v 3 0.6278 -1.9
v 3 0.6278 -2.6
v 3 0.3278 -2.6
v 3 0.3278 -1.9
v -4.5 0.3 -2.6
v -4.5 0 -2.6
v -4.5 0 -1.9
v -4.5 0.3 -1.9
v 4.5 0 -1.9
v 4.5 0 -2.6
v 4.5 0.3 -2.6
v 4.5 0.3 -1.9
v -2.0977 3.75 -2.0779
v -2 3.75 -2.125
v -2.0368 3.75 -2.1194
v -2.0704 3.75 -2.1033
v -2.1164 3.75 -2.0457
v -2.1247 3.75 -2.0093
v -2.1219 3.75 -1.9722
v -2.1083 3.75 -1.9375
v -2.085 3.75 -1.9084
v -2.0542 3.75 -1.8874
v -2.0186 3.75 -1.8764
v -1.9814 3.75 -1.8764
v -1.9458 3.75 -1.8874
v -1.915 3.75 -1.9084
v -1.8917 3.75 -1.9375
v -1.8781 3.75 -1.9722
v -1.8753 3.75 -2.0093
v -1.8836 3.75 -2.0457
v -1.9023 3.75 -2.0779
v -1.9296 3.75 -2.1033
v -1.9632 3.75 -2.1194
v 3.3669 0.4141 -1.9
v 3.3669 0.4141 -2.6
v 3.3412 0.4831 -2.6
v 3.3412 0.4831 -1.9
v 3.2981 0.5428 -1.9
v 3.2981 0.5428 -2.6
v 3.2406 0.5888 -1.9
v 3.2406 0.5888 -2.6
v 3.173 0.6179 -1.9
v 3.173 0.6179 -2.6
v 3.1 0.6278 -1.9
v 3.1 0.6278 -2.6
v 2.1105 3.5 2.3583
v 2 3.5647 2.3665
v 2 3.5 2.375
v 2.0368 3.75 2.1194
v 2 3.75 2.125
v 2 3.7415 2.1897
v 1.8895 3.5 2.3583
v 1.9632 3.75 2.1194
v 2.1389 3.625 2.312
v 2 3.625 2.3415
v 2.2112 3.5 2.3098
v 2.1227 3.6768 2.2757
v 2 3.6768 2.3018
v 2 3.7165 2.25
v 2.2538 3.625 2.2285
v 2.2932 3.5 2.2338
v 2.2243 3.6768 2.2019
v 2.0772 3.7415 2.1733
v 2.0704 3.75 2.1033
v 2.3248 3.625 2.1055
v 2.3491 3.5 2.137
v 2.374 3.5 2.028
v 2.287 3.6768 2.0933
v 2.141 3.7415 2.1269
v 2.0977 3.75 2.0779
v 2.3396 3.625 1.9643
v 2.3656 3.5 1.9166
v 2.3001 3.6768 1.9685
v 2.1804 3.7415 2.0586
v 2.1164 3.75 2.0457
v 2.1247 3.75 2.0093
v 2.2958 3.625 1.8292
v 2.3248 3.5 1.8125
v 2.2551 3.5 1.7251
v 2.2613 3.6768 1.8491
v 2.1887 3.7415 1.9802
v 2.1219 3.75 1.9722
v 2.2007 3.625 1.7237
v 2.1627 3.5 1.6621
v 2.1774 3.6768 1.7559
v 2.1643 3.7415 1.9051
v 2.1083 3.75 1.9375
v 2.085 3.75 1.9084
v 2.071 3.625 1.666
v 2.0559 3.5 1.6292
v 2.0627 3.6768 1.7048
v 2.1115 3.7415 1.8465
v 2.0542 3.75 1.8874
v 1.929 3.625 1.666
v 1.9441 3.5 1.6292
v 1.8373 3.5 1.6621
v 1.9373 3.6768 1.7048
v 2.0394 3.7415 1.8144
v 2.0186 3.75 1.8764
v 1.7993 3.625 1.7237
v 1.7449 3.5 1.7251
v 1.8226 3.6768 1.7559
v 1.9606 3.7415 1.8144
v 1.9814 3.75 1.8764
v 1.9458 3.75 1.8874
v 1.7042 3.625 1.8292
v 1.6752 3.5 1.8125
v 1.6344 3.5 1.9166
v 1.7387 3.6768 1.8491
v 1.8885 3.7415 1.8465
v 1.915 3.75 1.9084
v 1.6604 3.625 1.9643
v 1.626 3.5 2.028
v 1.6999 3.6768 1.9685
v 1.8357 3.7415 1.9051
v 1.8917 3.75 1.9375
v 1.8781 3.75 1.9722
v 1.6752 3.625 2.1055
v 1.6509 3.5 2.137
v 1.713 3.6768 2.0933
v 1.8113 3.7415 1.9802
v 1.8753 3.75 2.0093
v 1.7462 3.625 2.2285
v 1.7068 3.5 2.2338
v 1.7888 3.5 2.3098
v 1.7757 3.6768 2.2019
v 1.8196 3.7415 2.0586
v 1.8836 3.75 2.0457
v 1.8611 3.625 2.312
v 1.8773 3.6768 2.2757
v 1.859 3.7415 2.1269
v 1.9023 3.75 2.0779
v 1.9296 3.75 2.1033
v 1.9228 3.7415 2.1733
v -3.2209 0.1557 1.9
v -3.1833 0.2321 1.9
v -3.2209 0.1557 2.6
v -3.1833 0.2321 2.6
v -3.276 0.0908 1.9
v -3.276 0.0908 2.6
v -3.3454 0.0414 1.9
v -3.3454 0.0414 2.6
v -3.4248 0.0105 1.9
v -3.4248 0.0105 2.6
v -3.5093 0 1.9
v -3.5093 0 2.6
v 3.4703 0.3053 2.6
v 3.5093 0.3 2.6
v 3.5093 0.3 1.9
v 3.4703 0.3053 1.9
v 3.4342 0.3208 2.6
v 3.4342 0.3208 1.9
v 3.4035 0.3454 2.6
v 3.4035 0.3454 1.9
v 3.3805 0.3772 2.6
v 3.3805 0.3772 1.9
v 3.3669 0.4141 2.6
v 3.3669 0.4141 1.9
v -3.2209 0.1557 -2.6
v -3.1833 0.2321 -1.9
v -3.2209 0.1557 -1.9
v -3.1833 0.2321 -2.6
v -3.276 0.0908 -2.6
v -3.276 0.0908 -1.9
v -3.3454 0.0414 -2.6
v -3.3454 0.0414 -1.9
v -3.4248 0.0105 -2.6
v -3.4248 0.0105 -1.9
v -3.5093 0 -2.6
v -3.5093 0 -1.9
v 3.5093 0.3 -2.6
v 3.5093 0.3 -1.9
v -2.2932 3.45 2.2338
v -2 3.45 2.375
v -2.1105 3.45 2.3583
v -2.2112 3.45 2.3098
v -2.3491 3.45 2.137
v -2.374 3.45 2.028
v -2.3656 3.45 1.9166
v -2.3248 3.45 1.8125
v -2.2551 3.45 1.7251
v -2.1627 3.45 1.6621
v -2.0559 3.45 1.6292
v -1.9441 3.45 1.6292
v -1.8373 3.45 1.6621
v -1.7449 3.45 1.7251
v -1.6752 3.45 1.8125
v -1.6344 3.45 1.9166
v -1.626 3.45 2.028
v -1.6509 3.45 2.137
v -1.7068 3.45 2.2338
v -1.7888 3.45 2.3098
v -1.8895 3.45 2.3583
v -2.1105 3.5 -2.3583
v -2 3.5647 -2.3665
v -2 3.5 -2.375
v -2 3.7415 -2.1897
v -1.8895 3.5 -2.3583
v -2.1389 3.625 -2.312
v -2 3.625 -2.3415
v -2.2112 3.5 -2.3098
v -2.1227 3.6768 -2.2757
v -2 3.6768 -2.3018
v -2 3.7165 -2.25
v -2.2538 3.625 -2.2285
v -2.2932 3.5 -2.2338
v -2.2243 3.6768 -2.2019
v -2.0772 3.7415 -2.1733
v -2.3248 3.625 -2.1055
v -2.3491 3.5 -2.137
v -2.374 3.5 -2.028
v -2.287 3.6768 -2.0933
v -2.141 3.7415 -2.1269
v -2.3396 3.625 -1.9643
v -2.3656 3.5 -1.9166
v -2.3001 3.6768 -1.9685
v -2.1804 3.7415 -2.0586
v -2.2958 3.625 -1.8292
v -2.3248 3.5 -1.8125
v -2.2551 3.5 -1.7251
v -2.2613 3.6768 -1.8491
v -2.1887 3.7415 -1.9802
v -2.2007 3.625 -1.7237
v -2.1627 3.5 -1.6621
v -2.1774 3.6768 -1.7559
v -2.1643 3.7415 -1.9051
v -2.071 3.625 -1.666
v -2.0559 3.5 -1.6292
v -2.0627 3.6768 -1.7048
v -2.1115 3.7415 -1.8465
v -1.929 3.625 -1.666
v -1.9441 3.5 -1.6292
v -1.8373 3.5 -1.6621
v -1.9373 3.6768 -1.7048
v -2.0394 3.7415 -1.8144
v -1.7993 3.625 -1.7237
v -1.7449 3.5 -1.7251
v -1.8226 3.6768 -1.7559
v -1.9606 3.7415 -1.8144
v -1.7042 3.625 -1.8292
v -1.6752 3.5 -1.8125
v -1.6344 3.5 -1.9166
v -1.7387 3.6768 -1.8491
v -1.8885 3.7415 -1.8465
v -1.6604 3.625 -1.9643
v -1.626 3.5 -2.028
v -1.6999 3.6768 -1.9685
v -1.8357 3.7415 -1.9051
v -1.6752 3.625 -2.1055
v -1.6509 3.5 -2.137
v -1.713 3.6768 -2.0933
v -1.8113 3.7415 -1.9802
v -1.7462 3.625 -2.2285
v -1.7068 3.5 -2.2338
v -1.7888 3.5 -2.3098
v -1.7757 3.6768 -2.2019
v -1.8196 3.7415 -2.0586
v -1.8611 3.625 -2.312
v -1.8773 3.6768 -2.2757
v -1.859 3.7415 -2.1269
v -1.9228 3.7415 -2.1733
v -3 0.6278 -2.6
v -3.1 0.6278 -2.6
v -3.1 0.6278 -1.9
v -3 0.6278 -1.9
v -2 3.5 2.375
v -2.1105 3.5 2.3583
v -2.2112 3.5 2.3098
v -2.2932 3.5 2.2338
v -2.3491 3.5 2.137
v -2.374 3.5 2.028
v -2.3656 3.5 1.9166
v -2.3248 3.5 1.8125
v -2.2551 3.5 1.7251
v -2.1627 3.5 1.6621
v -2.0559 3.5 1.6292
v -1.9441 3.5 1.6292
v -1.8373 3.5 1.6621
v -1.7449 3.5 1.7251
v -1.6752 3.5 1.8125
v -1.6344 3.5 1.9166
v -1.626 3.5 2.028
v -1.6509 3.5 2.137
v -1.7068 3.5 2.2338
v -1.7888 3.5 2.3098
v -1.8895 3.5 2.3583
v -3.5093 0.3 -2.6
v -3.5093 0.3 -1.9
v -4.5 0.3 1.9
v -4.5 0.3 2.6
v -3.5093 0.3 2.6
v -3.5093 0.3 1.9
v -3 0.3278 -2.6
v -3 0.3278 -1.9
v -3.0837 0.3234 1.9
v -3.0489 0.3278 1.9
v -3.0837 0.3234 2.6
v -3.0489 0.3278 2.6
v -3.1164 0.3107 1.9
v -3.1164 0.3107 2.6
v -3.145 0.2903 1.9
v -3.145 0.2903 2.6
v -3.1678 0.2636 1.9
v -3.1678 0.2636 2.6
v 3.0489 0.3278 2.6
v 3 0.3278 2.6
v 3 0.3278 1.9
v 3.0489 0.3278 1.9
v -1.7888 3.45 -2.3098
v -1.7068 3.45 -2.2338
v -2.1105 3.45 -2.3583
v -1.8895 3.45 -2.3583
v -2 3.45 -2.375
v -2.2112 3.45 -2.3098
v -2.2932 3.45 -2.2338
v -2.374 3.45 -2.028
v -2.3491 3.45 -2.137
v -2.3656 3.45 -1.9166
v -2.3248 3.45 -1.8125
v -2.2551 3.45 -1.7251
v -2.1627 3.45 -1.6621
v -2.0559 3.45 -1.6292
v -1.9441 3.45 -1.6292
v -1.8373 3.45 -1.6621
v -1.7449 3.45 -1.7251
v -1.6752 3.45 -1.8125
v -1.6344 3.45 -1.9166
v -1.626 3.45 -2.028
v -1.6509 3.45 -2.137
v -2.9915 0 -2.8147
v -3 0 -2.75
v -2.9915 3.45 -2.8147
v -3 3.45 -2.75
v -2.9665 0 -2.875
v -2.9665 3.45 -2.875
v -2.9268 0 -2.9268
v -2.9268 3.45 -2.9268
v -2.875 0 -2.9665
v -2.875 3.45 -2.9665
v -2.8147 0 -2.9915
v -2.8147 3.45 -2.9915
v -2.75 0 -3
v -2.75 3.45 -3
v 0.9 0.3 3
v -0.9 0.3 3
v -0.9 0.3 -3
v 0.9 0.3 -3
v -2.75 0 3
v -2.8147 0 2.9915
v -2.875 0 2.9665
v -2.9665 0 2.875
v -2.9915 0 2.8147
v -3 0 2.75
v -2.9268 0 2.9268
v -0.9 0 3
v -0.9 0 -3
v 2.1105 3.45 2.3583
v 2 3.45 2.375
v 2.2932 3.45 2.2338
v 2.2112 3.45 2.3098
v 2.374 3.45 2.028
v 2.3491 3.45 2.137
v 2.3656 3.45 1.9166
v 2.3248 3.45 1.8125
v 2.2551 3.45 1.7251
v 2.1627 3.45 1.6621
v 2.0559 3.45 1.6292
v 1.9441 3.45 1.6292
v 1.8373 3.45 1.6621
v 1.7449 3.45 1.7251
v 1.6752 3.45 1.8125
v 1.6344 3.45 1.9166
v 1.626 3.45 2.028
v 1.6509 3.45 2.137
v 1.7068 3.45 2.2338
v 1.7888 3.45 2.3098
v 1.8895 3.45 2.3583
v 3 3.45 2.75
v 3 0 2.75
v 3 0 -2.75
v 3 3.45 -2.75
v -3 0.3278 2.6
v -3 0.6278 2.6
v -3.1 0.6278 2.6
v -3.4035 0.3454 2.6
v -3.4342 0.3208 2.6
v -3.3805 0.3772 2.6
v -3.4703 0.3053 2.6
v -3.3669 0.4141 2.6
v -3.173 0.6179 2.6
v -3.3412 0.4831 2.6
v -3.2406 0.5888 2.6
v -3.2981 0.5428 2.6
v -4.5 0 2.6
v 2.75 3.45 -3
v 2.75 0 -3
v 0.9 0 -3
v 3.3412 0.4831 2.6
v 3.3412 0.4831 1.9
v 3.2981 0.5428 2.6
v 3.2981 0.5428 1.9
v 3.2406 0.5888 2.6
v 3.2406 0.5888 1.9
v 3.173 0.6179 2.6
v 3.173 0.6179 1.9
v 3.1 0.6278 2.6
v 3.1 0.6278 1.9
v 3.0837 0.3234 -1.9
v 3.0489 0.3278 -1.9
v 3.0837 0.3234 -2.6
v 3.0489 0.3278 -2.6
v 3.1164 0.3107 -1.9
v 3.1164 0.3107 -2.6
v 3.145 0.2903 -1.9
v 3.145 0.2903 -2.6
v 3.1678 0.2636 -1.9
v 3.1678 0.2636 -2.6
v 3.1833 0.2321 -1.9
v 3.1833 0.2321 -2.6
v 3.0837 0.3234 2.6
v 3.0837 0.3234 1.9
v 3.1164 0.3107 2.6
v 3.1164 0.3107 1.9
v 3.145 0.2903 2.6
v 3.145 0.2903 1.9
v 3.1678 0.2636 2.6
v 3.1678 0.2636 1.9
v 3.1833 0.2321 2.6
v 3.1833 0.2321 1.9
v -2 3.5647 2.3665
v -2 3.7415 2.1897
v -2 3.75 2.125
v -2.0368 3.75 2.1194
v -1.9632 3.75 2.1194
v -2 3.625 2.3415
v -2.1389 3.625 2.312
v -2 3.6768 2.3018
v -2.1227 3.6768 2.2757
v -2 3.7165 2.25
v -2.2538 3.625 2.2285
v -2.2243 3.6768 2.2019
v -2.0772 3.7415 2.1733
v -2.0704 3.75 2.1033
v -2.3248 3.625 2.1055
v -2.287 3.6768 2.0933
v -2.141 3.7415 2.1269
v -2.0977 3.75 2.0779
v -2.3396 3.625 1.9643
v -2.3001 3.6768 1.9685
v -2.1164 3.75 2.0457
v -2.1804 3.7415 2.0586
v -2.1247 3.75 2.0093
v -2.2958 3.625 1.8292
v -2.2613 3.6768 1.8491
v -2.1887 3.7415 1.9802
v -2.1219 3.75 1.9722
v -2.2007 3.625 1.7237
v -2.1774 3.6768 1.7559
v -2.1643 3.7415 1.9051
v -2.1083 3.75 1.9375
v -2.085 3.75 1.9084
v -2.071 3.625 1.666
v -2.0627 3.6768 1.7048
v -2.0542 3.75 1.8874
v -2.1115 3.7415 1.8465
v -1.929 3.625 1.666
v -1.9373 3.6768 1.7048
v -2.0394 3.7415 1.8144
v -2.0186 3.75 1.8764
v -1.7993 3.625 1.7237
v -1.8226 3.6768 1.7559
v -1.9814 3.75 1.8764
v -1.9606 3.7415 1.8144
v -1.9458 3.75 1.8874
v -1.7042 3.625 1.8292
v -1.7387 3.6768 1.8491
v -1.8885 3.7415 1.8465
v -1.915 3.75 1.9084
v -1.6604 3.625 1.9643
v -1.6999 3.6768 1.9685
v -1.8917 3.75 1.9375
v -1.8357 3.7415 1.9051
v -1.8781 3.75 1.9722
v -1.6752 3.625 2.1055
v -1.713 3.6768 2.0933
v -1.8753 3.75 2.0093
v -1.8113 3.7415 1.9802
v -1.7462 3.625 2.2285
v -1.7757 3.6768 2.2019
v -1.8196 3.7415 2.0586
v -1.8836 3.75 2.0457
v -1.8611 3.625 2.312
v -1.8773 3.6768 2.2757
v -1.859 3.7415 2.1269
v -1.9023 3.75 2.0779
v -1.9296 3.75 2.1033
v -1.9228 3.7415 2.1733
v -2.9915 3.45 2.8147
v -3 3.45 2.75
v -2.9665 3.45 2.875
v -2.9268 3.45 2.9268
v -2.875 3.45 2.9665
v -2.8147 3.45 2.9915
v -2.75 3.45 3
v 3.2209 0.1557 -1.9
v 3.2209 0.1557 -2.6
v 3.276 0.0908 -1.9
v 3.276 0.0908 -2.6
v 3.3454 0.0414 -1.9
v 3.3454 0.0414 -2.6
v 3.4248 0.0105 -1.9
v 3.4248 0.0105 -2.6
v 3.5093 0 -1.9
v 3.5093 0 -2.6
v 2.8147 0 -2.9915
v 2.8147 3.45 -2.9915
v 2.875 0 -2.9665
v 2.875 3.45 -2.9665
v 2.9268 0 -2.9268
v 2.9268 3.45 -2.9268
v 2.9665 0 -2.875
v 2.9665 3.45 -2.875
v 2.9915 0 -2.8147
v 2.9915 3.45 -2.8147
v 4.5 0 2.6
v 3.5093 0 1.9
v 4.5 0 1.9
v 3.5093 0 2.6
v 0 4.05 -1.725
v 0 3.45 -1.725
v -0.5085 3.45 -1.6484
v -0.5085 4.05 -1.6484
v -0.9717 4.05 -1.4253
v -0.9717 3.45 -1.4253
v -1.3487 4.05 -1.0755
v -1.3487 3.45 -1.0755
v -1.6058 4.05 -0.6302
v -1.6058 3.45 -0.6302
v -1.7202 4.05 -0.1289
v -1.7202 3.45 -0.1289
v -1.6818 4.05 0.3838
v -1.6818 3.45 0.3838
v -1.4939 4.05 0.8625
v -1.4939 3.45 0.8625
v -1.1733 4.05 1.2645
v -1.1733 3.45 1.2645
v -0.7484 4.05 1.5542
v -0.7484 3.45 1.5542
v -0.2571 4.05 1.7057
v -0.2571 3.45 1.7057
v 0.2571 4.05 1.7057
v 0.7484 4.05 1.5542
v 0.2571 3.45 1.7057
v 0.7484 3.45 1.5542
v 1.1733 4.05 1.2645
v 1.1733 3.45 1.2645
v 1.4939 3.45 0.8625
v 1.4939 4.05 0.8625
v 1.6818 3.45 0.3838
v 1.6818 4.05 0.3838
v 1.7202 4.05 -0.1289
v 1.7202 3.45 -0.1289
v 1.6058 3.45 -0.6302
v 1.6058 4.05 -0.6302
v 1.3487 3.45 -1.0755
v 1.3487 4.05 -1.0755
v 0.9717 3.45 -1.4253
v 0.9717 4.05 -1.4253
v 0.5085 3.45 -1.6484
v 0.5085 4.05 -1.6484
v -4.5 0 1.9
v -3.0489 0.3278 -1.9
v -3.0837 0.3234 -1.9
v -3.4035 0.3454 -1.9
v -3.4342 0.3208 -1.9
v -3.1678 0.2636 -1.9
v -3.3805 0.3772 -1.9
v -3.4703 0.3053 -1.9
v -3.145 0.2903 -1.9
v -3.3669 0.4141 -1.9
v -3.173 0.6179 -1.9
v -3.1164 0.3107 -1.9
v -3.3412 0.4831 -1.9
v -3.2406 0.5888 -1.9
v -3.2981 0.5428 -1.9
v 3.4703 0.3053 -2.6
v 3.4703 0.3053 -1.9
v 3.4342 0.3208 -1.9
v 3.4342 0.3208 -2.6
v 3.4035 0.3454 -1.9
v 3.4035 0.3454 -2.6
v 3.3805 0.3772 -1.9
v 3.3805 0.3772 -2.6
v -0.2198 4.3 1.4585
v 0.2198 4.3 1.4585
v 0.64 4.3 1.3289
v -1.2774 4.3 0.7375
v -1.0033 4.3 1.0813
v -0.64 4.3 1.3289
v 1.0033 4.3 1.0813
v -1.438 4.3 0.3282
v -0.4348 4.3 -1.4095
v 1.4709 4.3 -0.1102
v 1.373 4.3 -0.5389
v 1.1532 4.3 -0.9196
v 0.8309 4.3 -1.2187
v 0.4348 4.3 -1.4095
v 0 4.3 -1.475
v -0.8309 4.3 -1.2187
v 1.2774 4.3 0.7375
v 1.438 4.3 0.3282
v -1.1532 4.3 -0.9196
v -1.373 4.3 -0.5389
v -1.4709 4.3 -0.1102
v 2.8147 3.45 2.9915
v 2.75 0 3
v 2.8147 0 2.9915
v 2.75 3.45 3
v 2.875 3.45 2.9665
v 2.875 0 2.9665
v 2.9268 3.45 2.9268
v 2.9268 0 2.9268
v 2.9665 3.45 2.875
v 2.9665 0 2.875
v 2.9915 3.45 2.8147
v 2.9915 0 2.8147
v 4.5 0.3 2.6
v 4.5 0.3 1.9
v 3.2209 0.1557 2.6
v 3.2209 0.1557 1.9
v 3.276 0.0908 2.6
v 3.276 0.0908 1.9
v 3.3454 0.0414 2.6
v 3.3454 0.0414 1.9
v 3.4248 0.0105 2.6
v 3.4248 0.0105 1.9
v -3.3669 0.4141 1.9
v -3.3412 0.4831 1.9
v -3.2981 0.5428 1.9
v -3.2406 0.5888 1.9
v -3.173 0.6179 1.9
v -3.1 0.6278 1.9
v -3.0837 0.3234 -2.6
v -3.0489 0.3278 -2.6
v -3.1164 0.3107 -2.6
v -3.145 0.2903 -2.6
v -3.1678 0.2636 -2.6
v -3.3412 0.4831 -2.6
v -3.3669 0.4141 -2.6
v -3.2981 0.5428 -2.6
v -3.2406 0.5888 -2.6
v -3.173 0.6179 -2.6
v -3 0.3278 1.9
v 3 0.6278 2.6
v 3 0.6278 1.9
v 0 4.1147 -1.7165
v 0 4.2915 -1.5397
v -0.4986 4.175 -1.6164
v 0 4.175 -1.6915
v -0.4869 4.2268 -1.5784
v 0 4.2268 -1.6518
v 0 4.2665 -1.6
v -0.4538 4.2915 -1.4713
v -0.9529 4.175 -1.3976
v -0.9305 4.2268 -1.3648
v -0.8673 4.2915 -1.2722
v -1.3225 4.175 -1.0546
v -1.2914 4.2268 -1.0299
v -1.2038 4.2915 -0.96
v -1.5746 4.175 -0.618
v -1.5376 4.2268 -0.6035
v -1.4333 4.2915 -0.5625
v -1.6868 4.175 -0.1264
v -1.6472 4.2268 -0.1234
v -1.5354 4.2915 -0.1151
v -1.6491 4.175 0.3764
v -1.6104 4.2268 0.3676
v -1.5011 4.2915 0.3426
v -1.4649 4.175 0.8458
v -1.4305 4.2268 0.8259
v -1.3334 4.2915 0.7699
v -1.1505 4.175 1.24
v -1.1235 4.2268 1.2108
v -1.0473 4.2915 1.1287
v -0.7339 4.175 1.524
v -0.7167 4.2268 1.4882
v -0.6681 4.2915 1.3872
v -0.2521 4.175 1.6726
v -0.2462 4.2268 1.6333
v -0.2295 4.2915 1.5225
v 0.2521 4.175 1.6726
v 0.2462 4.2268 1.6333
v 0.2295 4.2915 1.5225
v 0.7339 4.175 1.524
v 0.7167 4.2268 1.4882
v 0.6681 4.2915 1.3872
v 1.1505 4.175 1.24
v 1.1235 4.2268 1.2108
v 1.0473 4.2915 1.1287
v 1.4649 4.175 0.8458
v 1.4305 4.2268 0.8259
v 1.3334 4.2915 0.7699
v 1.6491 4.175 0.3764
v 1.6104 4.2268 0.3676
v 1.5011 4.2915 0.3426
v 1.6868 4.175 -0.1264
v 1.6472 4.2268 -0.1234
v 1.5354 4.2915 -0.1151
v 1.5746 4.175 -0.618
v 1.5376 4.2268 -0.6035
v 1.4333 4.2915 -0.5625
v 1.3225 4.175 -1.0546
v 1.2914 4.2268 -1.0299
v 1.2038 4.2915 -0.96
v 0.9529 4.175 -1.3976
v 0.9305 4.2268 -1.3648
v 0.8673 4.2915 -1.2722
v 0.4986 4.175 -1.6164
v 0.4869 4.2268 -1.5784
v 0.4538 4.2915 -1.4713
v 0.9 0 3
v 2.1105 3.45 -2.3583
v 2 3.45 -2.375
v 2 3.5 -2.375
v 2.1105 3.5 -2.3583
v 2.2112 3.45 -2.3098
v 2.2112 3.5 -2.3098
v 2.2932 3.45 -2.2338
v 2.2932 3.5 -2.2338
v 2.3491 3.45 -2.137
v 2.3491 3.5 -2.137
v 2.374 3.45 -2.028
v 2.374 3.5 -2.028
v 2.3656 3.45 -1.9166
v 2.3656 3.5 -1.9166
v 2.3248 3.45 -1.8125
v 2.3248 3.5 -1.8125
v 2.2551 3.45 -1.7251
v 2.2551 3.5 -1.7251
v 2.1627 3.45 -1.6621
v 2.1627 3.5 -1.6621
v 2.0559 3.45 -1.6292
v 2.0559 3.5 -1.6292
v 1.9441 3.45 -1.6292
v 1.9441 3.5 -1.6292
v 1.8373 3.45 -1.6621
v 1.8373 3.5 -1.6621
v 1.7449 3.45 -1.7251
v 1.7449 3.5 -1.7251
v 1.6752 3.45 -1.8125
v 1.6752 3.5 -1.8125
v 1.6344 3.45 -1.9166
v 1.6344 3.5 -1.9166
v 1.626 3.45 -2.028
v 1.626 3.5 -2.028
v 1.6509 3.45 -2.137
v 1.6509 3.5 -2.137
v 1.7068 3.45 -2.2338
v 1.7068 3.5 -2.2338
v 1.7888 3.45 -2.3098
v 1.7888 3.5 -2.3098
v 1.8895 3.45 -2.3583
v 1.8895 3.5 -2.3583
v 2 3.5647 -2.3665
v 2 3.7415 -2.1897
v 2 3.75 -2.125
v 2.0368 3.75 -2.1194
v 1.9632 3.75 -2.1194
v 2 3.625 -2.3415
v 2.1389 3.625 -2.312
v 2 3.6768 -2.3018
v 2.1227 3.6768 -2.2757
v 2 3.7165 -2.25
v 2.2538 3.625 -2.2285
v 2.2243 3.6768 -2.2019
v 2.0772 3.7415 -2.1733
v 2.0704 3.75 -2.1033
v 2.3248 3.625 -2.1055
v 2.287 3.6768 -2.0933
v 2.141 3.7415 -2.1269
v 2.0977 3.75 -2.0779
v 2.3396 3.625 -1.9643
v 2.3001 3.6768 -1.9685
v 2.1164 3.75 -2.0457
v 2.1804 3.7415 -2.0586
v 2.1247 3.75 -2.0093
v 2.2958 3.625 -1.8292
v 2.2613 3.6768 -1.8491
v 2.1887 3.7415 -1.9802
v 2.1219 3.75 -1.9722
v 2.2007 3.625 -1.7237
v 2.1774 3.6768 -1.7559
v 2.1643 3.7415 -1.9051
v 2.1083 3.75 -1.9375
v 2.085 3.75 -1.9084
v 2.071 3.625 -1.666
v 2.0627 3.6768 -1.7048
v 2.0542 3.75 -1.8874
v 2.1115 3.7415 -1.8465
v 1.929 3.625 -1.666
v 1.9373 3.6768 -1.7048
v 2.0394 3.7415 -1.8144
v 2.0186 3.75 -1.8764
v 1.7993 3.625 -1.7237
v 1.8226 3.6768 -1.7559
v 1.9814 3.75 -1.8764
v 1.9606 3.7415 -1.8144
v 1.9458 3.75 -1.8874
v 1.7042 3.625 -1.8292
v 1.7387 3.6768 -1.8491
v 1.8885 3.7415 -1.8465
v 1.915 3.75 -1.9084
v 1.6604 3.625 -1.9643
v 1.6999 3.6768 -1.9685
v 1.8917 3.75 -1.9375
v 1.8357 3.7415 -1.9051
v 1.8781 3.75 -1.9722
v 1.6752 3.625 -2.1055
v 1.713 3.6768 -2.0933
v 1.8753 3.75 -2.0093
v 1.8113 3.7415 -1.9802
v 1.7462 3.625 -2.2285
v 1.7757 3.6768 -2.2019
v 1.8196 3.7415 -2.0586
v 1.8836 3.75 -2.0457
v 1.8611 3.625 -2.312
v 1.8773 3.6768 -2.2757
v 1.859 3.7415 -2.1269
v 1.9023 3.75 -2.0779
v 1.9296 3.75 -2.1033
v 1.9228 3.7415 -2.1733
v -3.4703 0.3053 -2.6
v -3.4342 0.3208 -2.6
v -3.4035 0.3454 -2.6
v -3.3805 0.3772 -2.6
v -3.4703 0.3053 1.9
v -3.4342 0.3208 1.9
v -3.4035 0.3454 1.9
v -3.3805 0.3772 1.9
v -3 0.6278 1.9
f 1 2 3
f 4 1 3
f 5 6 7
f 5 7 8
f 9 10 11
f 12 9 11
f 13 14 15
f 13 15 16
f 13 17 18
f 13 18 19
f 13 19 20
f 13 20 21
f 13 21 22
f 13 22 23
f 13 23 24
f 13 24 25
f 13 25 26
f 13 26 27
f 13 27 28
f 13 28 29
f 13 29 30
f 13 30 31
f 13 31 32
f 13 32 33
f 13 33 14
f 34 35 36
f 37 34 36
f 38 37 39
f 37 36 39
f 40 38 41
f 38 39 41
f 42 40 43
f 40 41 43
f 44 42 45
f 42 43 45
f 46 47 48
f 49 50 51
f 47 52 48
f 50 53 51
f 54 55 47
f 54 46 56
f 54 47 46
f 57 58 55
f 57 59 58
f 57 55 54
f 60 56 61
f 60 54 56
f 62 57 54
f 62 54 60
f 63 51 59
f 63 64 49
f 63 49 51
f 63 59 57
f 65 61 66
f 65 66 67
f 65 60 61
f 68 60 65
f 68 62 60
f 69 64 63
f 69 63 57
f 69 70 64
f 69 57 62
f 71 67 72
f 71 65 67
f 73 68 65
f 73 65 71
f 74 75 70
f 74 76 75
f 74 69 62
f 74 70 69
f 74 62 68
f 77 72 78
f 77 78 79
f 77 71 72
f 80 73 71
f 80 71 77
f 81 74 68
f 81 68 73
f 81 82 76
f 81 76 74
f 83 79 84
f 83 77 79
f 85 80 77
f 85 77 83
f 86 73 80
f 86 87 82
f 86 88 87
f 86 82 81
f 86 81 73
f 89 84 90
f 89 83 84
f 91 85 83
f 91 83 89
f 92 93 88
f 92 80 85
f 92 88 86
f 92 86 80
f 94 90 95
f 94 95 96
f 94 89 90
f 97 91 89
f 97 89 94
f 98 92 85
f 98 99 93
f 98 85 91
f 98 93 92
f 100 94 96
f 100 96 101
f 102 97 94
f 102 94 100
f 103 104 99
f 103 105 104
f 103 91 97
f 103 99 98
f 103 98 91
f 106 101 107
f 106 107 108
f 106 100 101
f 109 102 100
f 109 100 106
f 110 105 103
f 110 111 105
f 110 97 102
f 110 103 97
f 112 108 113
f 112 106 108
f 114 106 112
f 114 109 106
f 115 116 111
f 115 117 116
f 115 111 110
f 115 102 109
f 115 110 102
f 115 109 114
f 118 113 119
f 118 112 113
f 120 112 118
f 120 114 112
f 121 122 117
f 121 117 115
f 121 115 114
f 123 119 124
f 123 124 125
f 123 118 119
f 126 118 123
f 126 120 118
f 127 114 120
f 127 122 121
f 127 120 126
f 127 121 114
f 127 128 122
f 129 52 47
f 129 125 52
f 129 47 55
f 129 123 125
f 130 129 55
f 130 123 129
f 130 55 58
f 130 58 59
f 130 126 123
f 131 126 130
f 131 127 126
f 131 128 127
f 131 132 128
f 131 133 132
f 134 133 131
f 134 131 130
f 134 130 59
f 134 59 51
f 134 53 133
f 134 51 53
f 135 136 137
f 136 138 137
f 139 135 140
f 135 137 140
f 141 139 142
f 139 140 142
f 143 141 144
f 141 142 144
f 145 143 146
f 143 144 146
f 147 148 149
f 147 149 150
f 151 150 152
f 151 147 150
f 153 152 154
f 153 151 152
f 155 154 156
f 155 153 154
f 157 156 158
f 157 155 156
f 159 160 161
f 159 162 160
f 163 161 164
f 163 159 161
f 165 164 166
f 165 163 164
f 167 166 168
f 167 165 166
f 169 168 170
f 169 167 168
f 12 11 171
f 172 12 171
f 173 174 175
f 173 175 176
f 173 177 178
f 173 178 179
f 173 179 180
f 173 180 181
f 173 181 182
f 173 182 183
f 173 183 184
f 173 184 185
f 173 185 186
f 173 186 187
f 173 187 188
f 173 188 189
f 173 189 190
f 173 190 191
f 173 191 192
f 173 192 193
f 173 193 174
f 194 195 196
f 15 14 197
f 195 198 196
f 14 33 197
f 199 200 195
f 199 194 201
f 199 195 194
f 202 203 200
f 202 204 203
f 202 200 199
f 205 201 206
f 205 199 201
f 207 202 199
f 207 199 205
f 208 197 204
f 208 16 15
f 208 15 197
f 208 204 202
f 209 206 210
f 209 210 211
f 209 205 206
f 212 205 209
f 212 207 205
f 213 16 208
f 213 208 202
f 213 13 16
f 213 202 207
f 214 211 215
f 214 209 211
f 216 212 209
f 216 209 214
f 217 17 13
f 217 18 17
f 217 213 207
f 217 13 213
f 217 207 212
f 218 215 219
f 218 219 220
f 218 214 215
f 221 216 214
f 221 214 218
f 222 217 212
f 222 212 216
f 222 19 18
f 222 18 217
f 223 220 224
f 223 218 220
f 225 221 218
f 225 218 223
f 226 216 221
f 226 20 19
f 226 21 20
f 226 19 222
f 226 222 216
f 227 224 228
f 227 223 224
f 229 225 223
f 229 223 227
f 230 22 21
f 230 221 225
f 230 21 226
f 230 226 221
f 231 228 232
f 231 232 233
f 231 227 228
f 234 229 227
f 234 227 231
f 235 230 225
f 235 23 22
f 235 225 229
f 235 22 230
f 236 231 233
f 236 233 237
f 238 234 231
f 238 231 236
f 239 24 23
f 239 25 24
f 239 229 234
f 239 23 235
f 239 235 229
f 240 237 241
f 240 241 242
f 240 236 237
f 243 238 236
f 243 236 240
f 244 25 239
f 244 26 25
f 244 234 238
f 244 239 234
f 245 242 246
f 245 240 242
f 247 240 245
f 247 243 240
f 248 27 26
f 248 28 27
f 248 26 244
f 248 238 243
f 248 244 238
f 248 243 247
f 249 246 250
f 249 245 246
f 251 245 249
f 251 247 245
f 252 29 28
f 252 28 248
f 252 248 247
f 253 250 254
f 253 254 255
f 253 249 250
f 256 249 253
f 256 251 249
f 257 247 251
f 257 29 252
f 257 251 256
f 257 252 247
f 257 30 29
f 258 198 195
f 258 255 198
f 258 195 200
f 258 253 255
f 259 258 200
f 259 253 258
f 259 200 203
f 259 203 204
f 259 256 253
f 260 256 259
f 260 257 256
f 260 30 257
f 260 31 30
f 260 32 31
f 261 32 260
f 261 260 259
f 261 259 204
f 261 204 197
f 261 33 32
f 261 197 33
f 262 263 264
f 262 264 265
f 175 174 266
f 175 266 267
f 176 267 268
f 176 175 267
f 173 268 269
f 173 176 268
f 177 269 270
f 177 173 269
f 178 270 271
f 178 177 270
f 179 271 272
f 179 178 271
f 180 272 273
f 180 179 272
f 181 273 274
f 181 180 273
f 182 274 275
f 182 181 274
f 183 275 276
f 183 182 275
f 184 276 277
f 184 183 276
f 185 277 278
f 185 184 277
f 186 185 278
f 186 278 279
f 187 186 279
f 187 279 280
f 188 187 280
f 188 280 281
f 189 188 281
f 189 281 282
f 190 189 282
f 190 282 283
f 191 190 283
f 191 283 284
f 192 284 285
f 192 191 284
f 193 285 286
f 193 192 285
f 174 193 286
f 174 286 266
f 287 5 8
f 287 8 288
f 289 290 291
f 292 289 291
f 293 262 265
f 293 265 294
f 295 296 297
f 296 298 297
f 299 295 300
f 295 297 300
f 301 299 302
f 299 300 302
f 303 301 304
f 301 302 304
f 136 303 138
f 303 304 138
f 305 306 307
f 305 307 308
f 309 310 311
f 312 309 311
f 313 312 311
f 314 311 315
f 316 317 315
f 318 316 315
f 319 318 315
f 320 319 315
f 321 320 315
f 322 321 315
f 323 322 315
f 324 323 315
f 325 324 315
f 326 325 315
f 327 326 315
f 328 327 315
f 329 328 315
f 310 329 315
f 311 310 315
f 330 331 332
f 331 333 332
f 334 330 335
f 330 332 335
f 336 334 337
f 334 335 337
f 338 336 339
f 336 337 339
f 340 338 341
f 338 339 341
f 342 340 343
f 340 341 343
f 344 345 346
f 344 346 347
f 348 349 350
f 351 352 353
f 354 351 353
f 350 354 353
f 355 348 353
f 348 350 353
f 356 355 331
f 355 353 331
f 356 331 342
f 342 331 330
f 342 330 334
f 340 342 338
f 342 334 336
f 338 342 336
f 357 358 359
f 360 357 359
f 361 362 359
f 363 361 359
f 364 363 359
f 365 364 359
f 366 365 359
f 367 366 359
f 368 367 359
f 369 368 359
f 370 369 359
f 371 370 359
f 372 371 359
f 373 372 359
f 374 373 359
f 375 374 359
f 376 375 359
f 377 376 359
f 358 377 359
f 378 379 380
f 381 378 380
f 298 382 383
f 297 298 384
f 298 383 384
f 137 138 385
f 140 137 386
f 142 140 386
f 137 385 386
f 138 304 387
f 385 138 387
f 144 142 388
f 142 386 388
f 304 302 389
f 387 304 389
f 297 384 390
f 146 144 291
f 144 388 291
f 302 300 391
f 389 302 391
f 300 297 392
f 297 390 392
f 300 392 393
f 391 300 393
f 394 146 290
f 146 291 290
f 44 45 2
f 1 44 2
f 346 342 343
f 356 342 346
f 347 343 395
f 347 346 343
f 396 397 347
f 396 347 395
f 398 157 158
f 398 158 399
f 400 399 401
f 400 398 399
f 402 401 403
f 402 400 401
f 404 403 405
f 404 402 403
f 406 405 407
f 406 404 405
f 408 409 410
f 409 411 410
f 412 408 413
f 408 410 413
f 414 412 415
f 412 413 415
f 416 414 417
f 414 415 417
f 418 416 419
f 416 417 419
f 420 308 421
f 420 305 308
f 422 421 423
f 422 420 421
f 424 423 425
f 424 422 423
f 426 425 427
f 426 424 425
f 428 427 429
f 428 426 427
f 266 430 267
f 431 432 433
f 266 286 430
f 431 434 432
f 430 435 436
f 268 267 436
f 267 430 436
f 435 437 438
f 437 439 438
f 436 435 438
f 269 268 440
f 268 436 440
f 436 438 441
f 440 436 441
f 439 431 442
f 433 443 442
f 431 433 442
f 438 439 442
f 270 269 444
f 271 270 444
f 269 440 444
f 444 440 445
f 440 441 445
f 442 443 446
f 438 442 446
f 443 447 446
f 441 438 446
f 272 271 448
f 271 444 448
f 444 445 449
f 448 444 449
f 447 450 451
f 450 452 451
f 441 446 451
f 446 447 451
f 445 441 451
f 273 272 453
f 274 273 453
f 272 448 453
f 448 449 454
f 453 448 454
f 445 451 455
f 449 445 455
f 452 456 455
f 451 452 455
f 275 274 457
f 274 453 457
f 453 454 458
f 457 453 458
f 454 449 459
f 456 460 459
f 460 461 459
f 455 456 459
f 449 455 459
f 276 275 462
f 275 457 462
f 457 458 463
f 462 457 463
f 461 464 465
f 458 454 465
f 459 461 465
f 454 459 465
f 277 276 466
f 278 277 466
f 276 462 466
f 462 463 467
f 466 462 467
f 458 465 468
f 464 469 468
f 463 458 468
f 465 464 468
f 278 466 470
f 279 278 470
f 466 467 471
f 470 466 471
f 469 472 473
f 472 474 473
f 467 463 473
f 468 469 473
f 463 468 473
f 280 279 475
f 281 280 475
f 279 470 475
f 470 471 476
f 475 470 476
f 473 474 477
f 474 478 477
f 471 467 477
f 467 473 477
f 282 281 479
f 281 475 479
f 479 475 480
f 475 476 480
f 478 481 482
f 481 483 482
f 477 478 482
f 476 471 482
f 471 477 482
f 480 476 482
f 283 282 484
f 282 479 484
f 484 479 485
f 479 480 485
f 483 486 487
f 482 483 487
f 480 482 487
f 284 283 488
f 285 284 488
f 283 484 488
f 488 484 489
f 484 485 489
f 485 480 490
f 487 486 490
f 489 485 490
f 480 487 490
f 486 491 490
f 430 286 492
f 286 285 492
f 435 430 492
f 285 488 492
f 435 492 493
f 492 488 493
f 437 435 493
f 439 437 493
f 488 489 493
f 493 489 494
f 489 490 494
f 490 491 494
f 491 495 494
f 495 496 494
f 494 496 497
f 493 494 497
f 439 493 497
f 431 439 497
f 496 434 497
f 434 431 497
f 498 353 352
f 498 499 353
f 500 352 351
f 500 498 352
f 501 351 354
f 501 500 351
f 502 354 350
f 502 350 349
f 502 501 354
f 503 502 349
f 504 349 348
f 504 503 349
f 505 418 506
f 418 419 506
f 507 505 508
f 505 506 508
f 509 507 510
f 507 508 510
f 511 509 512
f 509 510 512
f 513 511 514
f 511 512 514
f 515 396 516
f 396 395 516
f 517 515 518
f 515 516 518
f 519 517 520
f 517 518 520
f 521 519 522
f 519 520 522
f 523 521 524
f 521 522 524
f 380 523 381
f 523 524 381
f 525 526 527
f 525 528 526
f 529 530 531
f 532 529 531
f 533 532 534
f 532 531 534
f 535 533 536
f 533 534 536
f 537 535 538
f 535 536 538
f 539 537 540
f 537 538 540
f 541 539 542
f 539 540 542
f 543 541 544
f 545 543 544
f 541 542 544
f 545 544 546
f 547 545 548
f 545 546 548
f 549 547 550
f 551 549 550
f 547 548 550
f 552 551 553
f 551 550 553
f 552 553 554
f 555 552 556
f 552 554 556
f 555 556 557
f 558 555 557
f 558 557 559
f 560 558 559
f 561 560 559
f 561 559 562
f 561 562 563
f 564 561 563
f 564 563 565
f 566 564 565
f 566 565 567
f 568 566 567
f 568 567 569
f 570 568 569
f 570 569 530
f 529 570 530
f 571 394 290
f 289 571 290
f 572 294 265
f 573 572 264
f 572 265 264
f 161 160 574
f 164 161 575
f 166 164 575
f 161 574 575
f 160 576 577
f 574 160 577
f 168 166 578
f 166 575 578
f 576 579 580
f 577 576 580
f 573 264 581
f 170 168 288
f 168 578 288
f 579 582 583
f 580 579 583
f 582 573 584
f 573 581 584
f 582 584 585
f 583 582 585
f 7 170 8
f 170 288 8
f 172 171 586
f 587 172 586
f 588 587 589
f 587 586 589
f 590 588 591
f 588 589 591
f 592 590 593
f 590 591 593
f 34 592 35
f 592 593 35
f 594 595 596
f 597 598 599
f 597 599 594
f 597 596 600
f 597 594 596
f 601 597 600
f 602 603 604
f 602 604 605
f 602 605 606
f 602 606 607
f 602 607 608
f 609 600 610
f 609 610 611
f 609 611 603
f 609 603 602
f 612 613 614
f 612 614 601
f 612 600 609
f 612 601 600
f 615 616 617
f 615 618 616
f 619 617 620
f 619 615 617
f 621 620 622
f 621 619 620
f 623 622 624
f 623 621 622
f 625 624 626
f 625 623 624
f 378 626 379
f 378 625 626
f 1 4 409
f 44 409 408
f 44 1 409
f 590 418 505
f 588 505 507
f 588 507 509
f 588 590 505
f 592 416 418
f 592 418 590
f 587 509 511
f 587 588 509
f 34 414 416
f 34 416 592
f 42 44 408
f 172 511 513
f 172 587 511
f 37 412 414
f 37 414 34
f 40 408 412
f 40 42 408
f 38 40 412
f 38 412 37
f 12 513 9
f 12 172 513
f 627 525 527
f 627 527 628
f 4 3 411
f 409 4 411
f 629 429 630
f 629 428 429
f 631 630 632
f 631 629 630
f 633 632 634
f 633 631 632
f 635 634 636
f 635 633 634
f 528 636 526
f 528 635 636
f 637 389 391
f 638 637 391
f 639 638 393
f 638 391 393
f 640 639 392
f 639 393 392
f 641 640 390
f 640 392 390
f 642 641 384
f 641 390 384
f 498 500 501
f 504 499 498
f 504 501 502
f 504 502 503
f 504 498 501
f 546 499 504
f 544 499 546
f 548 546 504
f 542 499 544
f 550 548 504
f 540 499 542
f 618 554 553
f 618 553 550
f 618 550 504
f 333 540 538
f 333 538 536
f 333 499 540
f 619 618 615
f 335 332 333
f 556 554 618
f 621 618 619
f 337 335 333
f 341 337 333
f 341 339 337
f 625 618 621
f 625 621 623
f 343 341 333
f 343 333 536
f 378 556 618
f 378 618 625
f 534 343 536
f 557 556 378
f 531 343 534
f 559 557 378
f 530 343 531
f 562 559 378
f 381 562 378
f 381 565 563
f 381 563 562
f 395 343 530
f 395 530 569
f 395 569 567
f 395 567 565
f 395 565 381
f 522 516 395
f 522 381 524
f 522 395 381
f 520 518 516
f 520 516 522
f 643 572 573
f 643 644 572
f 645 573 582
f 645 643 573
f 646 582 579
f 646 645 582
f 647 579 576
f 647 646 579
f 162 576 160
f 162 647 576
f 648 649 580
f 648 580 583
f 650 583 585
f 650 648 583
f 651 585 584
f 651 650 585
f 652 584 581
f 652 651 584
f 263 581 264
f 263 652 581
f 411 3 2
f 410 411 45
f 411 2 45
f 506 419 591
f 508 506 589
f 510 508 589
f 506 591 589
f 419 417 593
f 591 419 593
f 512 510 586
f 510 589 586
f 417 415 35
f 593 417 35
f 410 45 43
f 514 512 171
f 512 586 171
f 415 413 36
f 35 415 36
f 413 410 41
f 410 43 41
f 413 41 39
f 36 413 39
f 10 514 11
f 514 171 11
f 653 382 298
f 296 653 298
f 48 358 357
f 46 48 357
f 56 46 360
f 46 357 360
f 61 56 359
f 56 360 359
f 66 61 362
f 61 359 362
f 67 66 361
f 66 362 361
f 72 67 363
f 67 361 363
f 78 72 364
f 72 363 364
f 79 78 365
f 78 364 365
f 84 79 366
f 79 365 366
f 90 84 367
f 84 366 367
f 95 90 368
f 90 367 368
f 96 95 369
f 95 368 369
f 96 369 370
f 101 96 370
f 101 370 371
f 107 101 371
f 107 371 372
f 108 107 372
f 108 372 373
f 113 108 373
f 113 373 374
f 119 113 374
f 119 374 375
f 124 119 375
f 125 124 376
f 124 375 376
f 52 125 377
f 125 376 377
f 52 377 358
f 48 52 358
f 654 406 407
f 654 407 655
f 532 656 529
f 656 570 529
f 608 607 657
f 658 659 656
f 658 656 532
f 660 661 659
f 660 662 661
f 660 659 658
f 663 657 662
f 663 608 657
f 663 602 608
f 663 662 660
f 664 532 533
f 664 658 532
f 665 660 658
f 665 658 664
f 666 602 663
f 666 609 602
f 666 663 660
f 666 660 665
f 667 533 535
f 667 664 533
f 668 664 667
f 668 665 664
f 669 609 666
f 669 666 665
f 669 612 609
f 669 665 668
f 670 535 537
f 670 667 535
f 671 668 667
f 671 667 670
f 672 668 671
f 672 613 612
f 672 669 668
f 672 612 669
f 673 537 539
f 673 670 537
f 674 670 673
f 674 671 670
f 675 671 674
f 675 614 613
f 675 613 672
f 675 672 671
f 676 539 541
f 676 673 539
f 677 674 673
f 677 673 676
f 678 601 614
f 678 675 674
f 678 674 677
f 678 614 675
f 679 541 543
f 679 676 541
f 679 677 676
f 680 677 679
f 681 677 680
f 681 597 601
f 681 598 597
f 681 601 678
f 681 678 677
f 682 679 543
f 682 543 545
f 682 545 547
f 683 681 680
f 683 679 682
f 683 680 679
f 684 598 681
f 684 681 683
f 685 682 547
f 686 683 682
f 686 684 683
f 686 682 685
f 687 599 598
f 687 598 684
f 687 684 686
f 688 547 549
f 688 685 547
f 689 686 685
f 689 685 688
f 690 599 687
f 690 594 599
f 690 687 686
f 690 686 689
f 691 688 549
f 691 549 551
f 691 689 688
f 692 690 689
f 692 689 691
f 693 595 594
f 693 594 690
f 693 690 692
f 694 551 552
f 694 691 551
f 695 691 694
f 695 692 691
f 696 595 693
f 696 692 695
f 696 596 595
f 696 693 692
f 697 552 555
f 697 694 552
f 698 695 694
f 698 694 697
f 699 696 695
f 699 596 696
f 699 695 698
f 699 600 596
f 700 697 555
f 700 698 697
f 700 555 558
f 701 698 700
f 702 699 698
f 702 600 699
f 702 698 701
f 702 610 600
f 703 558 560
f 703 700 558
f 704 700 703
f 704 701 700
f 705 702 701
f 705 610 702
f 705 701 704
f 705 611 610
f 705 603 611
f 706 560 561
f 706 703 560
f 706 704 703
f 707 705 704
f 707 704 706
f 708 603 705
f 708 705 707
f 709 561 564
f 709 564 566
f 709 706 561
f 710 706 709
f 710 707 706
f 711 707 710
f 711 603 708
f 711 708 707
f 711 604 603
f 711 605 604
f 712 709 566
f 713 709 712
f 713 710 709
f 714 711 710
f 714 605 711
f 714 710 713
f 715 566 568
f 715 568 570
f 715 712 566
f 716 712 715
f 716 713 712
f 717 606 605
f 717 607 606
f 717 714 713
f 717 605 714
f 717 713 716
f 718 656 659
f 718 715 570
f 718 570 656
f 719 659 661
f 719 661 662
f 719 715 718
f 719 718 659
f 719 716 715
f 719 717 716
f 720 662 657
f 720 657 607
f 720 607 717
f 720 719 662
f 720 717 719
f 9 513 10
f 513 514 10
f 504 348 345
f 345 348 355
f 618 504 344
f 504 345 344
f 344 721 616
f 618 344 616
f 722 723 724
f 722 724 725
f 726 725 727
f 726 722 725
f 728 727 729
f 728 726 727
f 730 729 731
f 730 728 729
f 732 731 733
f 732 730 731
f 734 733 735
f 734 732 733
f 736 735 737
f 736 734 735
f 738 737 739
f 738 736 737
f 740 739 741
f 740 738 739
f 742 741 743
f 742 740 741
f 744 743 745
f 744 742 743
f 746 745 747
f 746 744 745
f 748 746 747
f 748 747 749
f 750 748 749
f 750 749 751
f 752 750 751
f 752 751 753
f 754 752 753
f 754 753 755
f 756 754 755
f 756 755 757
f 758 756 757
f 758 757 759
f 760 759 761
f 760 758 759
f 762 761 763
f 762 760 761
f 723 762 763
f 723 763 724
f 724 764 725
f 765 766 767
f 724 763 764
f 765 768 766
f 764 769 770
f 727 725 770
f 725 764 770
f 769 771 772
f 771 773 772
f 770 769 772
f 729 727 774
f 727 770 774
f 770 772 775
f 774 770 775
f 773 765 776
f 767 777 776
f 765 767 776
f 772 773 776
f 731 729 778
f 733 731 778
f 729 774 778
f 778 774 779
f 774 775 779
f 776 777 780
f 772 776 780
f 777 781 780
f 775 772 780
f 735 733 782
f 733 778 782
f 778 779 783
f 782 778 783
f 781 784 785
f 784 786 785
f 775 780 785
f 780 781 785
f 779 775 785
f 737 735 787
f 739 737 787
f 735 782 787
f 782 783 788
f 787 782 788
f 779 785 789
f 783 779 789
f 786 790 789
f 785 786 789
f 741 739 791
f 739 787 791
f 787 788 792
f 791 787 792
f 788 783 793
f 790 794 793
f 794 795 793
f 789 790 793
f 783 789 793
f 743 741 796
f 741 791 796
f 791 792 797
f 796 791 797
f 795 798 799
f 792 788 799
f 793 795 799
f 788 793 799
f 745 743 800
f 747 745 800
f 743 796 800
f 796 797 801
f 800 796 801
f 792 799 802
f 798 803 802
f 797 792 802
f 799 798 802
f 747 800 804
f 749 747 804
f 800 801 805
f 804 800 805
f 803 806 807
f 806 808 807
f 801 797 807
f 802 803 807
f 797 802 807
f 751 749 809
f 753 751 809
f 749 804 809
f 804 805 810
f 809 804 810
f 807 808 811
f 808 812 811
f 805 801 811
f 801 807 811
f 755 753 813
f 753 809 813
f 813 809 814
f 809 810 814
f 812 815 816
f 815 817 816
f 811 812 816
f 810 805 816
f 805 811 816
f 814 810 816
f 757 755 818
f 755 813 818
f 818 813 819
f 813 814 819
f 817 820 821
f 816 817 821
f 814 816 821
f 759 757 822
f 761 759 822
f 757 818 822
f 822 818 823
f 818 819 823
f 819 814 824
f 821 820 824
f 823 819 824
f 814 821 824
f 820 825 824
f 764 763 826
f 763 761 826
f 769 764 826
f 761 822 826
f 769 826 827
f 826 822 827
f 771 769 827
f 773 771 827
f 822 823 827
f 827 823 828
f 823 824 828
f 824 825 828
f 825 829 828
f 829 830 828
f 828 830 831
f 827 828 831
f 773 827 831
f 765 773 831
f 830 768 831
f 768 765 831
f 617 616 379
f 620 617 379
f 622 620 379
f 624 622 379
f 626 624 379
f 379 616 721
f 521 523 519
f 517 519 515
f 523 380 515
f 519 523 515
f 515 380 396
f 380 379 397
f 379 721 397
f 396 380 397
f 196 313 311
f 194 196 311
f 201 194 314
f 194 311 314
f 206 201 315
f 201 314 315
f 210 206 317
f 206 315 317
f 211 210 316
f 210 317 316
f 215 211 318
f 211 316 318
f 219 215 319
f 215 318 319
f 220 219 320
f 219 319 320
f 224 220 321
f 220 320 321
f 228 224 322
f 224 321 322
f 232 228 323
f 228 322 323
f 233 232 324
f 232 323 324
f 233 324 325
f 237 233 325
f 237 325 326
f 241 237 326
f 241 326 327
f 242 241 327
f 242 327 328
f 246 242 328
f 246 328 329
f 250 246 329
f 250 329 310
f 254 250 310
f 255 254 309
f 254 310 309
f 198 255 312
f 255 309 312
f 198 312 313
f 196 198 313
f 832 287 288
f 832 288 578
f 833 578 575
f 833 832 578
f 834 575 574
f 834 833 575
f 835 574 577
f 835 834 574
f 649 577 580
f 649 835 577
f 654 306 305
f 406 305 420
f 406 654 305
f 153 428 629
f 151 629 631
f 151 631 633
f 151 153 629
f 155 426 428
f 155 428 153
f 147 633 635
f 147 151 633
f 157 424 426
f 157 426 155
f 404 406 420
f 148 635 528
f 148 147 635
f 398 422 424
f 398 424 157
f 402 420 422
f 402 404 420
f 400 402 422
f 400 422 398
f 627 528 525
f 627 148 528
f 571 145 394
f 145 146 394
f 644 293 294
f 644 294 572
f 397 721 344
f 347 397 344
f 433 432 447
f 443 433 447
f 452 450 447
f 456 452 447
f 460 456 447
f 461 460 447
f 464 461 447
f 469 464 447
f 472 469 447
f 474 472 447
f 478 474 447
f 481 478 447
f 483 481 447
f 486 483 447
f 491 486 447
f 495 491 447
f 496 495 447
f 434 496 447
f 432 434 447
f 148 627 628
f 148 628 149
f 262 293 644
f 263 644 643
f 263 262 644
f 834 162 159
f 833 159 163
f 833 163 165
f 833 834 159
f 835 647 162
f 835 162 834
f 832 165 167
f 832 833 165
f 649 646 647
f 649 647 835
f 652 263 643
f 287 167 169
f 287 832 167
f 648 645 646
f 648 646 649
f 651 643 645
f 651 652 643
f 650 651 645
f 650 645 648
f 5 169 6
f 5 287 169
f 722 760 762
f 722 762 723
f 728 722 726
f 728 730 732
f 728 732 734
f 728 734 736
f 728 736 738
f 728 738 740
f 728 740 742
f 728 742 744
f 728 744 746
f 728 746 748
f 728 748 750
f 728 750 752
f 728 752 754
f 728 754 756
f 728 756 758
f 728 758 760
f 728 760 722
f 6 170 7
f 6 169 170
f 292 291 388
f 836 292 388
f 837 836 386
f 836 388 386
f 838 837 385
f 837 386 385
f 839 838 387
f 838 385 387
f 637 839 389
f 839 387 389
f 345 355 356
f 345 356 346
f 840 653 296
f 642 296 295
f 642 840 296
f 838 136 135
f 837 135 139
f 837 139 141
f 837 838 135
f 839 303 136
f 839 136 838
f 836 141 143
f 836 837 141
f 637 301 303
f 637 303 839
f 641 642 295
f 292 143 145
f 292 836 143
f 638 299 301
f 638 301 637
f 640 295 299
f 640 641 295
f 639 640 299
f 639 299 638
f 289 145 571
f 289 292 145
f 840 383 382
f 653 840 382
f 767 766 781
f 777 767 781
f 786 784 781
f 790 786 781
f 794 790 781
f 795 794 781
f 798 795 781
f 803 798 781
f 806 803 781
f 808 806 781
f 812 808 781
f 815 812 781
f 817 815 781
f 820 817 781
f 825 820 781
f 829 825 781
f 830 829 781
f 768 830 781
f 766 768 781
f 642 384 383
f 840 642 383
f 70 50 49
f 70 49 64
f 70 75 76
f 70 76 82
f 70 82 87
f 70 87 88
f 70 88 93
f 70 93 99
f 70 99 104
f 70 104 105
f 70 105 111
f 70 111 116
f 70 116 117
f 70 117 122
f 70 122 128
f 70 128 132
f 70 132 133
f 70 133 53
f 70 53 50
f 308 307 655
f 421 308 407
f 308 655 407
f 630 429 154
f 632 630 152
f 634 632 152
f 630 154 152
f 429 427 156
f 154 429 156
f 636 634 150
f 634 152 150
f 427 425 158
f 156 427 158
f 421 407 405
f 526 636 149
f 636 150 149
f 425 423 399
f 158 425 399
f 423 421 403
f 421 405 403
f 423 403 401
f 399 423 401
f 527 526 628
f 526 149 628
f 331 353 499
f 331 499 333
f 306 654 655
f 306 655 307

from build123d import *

# Parameters (mm, degrees)
SKETCH1_W           = 6
SKETCH1_H           = 6
BOSS_EXTRUDE1_DEPTH = 3.45
BOSS_EXTRUDE2_START = -3.45
SKETCH2_R           = 1.725
BOSS_EXTRUDE2_DEPTH = 4.3
SKETCH3_R           = 0.375
BOSS_EXTRUDE3_DEPTH = 0.3
FILLET1_R           = 0.25
BOSS_EXTRUDE4_DEPTH = 0.35
SKETCH5_W           = 1.8
SKETCH5_H           = 0.3
CUT_EXTRUDE1_DEPTH  = 9.645229899
FILLET2_R           = 0.25
FILLET3_R           = 0.25


with BuildPart() as part:
    # Sketch1 → Boss-Extrude1 (new body)
    with BuildSketch(Plane(origin=(0, 0, 0), x_dir=(1, 0, 0), z_dir=(0, 1, 0))):
        Rectangle(SKETCH1_W, SKETCH1_H)
    extrude(amount=BOSS_EXTRUDE1_DEPTH)

    # Sketch2 → Boss-Extrude2 (add)
    with BuildSketch(Plane(origin=(0, 3.45, 0), x_dir=(1, 0, 0), z_dir=(0, 1, 0)).offset(BOSS_EXTRUDE2_START)):
        with Locations(Location((0, 0, 0), (0, 0, 90))):
            Circle(SKETCH2_R)
    extrude(amount=BOSS_EXTRUDE2_DEPTH)

    # Sketch5 → Cut-Extrude1 (cut, through all)
    with BuildSketch(Plane.XY.offset(3)):
        with Locations((0, 0.15)):
            Rectangle(SKETCH5_W, SKETCH5_H)
    extrude(amount=-CUT_EXTRUDE1_DEPTH, mode=Mode.SUBTRACT)

    # Fillet2
    fillet2_edges = [part.edges().sort_by_distance(p)[0] for p in [
        (3, 1.725, 3),
        (-3, 1.725, 3),
        (-3, 1.725, -3),
        (3, 1.725, -3),
    ]]
    fillet(fillet2_edges, radius=FILLET2_R)

    # Fillet3
    fillet3_edges = [part.edges().sort_by_distance(p)[0] for p in [
        (0, 4.3, 1.725),
    ]]
    fillet(fillet3_edges, radius=FILLET3_R)


with BuildPart() as body_2:
    # Sketch3 → Boss-Extrude3 (new body)
    with BuildSketch(Plane(origin=(0, 3.45, 0), x_dir=(1, 0, 0), z_dir=(0, 1, 0))):
        with Locations(Location((2, -2, 0), (0, 0, 270))):
            Circle(SKETCH3_R)
    extrude(amount=BOSS_EXTRUDE3_DEPTH)

    # Fillet1
    fillet1_edges = [body_2.edges().sort_by_distance(p)[0] for p in [
        (2, 3.75, 1.625),
    ]]
    fillet(fillet1_edges, radius=FILLET1_R)


with BuildPart() as body_3:
    # Sketch4 → Boss-Extrude4 (new, symmetric)
    with BuildSketch(Plane.XY.offset(2.25)):
        with BuildLine():
            Line((3.509281367, 0), (4.5, 0))
            Line((4.5, 0), (4.5, 0.3))
            Line((4.5, 0.3), (3.509281367, 0.3))
            ThreePointArc((3.509281367, 0.3), (3.418042895, 0.332032002), (3.366851512, 0.414068275))
            ThreePointArc((3.366851512, 0.414068275), (3.270941157, 0.567768521), (3.1, 0.627782541))
            Line((3.1, 0.627782541), (3, 0.627782541))
            Line((3, 0.627782541), (3, 0.327782541))
            Line((3, 0.327782541), (3.048875475, 0.327782541))
            ThreePointArc((3.048875475, 0.327782541), (3.131374008, 0.301415278), (3.183287911, 0.232088609))
            ThreePointArc((3.183287911, 0.232088609), (3.309195851, 0.063949105), (3.509281367, 0))
        make_face()
    extrude(amount=BOSS_EXTRUDE4_DEPTH, both=True)


with BuildPart() as body_4:
    # Mirror3: mirrored copy
    add(body_2.part.mirror(Plane(origin=(0, 0, 0), x_dir=(0, 0, 1), z_dir=(1, 0, 0))))


with BuildPart() as body_5:
    # Mirror3 2: mirrored copy
    add(body_3.part.mirror(Plane(origin=(0, 0, 0), x_dir=(0, 0, 1), z_dir=(1, 0, 0))))


with BuildPart() as body_6:
    # Mirror4: mirrored copy
    add(body_5.part.mirror(Plane.XY))


with BuildPart() as body_7:
    # Mirror4 2: mirrored copy
    add(body_4.part.mirror(Plane.XY))


with BuildPart() as body_8:
    # Mirror4 3: mirrored copy
    add(body_3.part.mirror(Plane.XY))


with BuildPart() as body_9:
    # Mirror4 4: mirrored copy
    add(body_2.part.mirror(Plane.XY))


solid = Compound([part.part, body_2.part, body_3.part, body_4.part, body_5.part, body_6.part, body_7.part, body_8.part, body_9.part])
